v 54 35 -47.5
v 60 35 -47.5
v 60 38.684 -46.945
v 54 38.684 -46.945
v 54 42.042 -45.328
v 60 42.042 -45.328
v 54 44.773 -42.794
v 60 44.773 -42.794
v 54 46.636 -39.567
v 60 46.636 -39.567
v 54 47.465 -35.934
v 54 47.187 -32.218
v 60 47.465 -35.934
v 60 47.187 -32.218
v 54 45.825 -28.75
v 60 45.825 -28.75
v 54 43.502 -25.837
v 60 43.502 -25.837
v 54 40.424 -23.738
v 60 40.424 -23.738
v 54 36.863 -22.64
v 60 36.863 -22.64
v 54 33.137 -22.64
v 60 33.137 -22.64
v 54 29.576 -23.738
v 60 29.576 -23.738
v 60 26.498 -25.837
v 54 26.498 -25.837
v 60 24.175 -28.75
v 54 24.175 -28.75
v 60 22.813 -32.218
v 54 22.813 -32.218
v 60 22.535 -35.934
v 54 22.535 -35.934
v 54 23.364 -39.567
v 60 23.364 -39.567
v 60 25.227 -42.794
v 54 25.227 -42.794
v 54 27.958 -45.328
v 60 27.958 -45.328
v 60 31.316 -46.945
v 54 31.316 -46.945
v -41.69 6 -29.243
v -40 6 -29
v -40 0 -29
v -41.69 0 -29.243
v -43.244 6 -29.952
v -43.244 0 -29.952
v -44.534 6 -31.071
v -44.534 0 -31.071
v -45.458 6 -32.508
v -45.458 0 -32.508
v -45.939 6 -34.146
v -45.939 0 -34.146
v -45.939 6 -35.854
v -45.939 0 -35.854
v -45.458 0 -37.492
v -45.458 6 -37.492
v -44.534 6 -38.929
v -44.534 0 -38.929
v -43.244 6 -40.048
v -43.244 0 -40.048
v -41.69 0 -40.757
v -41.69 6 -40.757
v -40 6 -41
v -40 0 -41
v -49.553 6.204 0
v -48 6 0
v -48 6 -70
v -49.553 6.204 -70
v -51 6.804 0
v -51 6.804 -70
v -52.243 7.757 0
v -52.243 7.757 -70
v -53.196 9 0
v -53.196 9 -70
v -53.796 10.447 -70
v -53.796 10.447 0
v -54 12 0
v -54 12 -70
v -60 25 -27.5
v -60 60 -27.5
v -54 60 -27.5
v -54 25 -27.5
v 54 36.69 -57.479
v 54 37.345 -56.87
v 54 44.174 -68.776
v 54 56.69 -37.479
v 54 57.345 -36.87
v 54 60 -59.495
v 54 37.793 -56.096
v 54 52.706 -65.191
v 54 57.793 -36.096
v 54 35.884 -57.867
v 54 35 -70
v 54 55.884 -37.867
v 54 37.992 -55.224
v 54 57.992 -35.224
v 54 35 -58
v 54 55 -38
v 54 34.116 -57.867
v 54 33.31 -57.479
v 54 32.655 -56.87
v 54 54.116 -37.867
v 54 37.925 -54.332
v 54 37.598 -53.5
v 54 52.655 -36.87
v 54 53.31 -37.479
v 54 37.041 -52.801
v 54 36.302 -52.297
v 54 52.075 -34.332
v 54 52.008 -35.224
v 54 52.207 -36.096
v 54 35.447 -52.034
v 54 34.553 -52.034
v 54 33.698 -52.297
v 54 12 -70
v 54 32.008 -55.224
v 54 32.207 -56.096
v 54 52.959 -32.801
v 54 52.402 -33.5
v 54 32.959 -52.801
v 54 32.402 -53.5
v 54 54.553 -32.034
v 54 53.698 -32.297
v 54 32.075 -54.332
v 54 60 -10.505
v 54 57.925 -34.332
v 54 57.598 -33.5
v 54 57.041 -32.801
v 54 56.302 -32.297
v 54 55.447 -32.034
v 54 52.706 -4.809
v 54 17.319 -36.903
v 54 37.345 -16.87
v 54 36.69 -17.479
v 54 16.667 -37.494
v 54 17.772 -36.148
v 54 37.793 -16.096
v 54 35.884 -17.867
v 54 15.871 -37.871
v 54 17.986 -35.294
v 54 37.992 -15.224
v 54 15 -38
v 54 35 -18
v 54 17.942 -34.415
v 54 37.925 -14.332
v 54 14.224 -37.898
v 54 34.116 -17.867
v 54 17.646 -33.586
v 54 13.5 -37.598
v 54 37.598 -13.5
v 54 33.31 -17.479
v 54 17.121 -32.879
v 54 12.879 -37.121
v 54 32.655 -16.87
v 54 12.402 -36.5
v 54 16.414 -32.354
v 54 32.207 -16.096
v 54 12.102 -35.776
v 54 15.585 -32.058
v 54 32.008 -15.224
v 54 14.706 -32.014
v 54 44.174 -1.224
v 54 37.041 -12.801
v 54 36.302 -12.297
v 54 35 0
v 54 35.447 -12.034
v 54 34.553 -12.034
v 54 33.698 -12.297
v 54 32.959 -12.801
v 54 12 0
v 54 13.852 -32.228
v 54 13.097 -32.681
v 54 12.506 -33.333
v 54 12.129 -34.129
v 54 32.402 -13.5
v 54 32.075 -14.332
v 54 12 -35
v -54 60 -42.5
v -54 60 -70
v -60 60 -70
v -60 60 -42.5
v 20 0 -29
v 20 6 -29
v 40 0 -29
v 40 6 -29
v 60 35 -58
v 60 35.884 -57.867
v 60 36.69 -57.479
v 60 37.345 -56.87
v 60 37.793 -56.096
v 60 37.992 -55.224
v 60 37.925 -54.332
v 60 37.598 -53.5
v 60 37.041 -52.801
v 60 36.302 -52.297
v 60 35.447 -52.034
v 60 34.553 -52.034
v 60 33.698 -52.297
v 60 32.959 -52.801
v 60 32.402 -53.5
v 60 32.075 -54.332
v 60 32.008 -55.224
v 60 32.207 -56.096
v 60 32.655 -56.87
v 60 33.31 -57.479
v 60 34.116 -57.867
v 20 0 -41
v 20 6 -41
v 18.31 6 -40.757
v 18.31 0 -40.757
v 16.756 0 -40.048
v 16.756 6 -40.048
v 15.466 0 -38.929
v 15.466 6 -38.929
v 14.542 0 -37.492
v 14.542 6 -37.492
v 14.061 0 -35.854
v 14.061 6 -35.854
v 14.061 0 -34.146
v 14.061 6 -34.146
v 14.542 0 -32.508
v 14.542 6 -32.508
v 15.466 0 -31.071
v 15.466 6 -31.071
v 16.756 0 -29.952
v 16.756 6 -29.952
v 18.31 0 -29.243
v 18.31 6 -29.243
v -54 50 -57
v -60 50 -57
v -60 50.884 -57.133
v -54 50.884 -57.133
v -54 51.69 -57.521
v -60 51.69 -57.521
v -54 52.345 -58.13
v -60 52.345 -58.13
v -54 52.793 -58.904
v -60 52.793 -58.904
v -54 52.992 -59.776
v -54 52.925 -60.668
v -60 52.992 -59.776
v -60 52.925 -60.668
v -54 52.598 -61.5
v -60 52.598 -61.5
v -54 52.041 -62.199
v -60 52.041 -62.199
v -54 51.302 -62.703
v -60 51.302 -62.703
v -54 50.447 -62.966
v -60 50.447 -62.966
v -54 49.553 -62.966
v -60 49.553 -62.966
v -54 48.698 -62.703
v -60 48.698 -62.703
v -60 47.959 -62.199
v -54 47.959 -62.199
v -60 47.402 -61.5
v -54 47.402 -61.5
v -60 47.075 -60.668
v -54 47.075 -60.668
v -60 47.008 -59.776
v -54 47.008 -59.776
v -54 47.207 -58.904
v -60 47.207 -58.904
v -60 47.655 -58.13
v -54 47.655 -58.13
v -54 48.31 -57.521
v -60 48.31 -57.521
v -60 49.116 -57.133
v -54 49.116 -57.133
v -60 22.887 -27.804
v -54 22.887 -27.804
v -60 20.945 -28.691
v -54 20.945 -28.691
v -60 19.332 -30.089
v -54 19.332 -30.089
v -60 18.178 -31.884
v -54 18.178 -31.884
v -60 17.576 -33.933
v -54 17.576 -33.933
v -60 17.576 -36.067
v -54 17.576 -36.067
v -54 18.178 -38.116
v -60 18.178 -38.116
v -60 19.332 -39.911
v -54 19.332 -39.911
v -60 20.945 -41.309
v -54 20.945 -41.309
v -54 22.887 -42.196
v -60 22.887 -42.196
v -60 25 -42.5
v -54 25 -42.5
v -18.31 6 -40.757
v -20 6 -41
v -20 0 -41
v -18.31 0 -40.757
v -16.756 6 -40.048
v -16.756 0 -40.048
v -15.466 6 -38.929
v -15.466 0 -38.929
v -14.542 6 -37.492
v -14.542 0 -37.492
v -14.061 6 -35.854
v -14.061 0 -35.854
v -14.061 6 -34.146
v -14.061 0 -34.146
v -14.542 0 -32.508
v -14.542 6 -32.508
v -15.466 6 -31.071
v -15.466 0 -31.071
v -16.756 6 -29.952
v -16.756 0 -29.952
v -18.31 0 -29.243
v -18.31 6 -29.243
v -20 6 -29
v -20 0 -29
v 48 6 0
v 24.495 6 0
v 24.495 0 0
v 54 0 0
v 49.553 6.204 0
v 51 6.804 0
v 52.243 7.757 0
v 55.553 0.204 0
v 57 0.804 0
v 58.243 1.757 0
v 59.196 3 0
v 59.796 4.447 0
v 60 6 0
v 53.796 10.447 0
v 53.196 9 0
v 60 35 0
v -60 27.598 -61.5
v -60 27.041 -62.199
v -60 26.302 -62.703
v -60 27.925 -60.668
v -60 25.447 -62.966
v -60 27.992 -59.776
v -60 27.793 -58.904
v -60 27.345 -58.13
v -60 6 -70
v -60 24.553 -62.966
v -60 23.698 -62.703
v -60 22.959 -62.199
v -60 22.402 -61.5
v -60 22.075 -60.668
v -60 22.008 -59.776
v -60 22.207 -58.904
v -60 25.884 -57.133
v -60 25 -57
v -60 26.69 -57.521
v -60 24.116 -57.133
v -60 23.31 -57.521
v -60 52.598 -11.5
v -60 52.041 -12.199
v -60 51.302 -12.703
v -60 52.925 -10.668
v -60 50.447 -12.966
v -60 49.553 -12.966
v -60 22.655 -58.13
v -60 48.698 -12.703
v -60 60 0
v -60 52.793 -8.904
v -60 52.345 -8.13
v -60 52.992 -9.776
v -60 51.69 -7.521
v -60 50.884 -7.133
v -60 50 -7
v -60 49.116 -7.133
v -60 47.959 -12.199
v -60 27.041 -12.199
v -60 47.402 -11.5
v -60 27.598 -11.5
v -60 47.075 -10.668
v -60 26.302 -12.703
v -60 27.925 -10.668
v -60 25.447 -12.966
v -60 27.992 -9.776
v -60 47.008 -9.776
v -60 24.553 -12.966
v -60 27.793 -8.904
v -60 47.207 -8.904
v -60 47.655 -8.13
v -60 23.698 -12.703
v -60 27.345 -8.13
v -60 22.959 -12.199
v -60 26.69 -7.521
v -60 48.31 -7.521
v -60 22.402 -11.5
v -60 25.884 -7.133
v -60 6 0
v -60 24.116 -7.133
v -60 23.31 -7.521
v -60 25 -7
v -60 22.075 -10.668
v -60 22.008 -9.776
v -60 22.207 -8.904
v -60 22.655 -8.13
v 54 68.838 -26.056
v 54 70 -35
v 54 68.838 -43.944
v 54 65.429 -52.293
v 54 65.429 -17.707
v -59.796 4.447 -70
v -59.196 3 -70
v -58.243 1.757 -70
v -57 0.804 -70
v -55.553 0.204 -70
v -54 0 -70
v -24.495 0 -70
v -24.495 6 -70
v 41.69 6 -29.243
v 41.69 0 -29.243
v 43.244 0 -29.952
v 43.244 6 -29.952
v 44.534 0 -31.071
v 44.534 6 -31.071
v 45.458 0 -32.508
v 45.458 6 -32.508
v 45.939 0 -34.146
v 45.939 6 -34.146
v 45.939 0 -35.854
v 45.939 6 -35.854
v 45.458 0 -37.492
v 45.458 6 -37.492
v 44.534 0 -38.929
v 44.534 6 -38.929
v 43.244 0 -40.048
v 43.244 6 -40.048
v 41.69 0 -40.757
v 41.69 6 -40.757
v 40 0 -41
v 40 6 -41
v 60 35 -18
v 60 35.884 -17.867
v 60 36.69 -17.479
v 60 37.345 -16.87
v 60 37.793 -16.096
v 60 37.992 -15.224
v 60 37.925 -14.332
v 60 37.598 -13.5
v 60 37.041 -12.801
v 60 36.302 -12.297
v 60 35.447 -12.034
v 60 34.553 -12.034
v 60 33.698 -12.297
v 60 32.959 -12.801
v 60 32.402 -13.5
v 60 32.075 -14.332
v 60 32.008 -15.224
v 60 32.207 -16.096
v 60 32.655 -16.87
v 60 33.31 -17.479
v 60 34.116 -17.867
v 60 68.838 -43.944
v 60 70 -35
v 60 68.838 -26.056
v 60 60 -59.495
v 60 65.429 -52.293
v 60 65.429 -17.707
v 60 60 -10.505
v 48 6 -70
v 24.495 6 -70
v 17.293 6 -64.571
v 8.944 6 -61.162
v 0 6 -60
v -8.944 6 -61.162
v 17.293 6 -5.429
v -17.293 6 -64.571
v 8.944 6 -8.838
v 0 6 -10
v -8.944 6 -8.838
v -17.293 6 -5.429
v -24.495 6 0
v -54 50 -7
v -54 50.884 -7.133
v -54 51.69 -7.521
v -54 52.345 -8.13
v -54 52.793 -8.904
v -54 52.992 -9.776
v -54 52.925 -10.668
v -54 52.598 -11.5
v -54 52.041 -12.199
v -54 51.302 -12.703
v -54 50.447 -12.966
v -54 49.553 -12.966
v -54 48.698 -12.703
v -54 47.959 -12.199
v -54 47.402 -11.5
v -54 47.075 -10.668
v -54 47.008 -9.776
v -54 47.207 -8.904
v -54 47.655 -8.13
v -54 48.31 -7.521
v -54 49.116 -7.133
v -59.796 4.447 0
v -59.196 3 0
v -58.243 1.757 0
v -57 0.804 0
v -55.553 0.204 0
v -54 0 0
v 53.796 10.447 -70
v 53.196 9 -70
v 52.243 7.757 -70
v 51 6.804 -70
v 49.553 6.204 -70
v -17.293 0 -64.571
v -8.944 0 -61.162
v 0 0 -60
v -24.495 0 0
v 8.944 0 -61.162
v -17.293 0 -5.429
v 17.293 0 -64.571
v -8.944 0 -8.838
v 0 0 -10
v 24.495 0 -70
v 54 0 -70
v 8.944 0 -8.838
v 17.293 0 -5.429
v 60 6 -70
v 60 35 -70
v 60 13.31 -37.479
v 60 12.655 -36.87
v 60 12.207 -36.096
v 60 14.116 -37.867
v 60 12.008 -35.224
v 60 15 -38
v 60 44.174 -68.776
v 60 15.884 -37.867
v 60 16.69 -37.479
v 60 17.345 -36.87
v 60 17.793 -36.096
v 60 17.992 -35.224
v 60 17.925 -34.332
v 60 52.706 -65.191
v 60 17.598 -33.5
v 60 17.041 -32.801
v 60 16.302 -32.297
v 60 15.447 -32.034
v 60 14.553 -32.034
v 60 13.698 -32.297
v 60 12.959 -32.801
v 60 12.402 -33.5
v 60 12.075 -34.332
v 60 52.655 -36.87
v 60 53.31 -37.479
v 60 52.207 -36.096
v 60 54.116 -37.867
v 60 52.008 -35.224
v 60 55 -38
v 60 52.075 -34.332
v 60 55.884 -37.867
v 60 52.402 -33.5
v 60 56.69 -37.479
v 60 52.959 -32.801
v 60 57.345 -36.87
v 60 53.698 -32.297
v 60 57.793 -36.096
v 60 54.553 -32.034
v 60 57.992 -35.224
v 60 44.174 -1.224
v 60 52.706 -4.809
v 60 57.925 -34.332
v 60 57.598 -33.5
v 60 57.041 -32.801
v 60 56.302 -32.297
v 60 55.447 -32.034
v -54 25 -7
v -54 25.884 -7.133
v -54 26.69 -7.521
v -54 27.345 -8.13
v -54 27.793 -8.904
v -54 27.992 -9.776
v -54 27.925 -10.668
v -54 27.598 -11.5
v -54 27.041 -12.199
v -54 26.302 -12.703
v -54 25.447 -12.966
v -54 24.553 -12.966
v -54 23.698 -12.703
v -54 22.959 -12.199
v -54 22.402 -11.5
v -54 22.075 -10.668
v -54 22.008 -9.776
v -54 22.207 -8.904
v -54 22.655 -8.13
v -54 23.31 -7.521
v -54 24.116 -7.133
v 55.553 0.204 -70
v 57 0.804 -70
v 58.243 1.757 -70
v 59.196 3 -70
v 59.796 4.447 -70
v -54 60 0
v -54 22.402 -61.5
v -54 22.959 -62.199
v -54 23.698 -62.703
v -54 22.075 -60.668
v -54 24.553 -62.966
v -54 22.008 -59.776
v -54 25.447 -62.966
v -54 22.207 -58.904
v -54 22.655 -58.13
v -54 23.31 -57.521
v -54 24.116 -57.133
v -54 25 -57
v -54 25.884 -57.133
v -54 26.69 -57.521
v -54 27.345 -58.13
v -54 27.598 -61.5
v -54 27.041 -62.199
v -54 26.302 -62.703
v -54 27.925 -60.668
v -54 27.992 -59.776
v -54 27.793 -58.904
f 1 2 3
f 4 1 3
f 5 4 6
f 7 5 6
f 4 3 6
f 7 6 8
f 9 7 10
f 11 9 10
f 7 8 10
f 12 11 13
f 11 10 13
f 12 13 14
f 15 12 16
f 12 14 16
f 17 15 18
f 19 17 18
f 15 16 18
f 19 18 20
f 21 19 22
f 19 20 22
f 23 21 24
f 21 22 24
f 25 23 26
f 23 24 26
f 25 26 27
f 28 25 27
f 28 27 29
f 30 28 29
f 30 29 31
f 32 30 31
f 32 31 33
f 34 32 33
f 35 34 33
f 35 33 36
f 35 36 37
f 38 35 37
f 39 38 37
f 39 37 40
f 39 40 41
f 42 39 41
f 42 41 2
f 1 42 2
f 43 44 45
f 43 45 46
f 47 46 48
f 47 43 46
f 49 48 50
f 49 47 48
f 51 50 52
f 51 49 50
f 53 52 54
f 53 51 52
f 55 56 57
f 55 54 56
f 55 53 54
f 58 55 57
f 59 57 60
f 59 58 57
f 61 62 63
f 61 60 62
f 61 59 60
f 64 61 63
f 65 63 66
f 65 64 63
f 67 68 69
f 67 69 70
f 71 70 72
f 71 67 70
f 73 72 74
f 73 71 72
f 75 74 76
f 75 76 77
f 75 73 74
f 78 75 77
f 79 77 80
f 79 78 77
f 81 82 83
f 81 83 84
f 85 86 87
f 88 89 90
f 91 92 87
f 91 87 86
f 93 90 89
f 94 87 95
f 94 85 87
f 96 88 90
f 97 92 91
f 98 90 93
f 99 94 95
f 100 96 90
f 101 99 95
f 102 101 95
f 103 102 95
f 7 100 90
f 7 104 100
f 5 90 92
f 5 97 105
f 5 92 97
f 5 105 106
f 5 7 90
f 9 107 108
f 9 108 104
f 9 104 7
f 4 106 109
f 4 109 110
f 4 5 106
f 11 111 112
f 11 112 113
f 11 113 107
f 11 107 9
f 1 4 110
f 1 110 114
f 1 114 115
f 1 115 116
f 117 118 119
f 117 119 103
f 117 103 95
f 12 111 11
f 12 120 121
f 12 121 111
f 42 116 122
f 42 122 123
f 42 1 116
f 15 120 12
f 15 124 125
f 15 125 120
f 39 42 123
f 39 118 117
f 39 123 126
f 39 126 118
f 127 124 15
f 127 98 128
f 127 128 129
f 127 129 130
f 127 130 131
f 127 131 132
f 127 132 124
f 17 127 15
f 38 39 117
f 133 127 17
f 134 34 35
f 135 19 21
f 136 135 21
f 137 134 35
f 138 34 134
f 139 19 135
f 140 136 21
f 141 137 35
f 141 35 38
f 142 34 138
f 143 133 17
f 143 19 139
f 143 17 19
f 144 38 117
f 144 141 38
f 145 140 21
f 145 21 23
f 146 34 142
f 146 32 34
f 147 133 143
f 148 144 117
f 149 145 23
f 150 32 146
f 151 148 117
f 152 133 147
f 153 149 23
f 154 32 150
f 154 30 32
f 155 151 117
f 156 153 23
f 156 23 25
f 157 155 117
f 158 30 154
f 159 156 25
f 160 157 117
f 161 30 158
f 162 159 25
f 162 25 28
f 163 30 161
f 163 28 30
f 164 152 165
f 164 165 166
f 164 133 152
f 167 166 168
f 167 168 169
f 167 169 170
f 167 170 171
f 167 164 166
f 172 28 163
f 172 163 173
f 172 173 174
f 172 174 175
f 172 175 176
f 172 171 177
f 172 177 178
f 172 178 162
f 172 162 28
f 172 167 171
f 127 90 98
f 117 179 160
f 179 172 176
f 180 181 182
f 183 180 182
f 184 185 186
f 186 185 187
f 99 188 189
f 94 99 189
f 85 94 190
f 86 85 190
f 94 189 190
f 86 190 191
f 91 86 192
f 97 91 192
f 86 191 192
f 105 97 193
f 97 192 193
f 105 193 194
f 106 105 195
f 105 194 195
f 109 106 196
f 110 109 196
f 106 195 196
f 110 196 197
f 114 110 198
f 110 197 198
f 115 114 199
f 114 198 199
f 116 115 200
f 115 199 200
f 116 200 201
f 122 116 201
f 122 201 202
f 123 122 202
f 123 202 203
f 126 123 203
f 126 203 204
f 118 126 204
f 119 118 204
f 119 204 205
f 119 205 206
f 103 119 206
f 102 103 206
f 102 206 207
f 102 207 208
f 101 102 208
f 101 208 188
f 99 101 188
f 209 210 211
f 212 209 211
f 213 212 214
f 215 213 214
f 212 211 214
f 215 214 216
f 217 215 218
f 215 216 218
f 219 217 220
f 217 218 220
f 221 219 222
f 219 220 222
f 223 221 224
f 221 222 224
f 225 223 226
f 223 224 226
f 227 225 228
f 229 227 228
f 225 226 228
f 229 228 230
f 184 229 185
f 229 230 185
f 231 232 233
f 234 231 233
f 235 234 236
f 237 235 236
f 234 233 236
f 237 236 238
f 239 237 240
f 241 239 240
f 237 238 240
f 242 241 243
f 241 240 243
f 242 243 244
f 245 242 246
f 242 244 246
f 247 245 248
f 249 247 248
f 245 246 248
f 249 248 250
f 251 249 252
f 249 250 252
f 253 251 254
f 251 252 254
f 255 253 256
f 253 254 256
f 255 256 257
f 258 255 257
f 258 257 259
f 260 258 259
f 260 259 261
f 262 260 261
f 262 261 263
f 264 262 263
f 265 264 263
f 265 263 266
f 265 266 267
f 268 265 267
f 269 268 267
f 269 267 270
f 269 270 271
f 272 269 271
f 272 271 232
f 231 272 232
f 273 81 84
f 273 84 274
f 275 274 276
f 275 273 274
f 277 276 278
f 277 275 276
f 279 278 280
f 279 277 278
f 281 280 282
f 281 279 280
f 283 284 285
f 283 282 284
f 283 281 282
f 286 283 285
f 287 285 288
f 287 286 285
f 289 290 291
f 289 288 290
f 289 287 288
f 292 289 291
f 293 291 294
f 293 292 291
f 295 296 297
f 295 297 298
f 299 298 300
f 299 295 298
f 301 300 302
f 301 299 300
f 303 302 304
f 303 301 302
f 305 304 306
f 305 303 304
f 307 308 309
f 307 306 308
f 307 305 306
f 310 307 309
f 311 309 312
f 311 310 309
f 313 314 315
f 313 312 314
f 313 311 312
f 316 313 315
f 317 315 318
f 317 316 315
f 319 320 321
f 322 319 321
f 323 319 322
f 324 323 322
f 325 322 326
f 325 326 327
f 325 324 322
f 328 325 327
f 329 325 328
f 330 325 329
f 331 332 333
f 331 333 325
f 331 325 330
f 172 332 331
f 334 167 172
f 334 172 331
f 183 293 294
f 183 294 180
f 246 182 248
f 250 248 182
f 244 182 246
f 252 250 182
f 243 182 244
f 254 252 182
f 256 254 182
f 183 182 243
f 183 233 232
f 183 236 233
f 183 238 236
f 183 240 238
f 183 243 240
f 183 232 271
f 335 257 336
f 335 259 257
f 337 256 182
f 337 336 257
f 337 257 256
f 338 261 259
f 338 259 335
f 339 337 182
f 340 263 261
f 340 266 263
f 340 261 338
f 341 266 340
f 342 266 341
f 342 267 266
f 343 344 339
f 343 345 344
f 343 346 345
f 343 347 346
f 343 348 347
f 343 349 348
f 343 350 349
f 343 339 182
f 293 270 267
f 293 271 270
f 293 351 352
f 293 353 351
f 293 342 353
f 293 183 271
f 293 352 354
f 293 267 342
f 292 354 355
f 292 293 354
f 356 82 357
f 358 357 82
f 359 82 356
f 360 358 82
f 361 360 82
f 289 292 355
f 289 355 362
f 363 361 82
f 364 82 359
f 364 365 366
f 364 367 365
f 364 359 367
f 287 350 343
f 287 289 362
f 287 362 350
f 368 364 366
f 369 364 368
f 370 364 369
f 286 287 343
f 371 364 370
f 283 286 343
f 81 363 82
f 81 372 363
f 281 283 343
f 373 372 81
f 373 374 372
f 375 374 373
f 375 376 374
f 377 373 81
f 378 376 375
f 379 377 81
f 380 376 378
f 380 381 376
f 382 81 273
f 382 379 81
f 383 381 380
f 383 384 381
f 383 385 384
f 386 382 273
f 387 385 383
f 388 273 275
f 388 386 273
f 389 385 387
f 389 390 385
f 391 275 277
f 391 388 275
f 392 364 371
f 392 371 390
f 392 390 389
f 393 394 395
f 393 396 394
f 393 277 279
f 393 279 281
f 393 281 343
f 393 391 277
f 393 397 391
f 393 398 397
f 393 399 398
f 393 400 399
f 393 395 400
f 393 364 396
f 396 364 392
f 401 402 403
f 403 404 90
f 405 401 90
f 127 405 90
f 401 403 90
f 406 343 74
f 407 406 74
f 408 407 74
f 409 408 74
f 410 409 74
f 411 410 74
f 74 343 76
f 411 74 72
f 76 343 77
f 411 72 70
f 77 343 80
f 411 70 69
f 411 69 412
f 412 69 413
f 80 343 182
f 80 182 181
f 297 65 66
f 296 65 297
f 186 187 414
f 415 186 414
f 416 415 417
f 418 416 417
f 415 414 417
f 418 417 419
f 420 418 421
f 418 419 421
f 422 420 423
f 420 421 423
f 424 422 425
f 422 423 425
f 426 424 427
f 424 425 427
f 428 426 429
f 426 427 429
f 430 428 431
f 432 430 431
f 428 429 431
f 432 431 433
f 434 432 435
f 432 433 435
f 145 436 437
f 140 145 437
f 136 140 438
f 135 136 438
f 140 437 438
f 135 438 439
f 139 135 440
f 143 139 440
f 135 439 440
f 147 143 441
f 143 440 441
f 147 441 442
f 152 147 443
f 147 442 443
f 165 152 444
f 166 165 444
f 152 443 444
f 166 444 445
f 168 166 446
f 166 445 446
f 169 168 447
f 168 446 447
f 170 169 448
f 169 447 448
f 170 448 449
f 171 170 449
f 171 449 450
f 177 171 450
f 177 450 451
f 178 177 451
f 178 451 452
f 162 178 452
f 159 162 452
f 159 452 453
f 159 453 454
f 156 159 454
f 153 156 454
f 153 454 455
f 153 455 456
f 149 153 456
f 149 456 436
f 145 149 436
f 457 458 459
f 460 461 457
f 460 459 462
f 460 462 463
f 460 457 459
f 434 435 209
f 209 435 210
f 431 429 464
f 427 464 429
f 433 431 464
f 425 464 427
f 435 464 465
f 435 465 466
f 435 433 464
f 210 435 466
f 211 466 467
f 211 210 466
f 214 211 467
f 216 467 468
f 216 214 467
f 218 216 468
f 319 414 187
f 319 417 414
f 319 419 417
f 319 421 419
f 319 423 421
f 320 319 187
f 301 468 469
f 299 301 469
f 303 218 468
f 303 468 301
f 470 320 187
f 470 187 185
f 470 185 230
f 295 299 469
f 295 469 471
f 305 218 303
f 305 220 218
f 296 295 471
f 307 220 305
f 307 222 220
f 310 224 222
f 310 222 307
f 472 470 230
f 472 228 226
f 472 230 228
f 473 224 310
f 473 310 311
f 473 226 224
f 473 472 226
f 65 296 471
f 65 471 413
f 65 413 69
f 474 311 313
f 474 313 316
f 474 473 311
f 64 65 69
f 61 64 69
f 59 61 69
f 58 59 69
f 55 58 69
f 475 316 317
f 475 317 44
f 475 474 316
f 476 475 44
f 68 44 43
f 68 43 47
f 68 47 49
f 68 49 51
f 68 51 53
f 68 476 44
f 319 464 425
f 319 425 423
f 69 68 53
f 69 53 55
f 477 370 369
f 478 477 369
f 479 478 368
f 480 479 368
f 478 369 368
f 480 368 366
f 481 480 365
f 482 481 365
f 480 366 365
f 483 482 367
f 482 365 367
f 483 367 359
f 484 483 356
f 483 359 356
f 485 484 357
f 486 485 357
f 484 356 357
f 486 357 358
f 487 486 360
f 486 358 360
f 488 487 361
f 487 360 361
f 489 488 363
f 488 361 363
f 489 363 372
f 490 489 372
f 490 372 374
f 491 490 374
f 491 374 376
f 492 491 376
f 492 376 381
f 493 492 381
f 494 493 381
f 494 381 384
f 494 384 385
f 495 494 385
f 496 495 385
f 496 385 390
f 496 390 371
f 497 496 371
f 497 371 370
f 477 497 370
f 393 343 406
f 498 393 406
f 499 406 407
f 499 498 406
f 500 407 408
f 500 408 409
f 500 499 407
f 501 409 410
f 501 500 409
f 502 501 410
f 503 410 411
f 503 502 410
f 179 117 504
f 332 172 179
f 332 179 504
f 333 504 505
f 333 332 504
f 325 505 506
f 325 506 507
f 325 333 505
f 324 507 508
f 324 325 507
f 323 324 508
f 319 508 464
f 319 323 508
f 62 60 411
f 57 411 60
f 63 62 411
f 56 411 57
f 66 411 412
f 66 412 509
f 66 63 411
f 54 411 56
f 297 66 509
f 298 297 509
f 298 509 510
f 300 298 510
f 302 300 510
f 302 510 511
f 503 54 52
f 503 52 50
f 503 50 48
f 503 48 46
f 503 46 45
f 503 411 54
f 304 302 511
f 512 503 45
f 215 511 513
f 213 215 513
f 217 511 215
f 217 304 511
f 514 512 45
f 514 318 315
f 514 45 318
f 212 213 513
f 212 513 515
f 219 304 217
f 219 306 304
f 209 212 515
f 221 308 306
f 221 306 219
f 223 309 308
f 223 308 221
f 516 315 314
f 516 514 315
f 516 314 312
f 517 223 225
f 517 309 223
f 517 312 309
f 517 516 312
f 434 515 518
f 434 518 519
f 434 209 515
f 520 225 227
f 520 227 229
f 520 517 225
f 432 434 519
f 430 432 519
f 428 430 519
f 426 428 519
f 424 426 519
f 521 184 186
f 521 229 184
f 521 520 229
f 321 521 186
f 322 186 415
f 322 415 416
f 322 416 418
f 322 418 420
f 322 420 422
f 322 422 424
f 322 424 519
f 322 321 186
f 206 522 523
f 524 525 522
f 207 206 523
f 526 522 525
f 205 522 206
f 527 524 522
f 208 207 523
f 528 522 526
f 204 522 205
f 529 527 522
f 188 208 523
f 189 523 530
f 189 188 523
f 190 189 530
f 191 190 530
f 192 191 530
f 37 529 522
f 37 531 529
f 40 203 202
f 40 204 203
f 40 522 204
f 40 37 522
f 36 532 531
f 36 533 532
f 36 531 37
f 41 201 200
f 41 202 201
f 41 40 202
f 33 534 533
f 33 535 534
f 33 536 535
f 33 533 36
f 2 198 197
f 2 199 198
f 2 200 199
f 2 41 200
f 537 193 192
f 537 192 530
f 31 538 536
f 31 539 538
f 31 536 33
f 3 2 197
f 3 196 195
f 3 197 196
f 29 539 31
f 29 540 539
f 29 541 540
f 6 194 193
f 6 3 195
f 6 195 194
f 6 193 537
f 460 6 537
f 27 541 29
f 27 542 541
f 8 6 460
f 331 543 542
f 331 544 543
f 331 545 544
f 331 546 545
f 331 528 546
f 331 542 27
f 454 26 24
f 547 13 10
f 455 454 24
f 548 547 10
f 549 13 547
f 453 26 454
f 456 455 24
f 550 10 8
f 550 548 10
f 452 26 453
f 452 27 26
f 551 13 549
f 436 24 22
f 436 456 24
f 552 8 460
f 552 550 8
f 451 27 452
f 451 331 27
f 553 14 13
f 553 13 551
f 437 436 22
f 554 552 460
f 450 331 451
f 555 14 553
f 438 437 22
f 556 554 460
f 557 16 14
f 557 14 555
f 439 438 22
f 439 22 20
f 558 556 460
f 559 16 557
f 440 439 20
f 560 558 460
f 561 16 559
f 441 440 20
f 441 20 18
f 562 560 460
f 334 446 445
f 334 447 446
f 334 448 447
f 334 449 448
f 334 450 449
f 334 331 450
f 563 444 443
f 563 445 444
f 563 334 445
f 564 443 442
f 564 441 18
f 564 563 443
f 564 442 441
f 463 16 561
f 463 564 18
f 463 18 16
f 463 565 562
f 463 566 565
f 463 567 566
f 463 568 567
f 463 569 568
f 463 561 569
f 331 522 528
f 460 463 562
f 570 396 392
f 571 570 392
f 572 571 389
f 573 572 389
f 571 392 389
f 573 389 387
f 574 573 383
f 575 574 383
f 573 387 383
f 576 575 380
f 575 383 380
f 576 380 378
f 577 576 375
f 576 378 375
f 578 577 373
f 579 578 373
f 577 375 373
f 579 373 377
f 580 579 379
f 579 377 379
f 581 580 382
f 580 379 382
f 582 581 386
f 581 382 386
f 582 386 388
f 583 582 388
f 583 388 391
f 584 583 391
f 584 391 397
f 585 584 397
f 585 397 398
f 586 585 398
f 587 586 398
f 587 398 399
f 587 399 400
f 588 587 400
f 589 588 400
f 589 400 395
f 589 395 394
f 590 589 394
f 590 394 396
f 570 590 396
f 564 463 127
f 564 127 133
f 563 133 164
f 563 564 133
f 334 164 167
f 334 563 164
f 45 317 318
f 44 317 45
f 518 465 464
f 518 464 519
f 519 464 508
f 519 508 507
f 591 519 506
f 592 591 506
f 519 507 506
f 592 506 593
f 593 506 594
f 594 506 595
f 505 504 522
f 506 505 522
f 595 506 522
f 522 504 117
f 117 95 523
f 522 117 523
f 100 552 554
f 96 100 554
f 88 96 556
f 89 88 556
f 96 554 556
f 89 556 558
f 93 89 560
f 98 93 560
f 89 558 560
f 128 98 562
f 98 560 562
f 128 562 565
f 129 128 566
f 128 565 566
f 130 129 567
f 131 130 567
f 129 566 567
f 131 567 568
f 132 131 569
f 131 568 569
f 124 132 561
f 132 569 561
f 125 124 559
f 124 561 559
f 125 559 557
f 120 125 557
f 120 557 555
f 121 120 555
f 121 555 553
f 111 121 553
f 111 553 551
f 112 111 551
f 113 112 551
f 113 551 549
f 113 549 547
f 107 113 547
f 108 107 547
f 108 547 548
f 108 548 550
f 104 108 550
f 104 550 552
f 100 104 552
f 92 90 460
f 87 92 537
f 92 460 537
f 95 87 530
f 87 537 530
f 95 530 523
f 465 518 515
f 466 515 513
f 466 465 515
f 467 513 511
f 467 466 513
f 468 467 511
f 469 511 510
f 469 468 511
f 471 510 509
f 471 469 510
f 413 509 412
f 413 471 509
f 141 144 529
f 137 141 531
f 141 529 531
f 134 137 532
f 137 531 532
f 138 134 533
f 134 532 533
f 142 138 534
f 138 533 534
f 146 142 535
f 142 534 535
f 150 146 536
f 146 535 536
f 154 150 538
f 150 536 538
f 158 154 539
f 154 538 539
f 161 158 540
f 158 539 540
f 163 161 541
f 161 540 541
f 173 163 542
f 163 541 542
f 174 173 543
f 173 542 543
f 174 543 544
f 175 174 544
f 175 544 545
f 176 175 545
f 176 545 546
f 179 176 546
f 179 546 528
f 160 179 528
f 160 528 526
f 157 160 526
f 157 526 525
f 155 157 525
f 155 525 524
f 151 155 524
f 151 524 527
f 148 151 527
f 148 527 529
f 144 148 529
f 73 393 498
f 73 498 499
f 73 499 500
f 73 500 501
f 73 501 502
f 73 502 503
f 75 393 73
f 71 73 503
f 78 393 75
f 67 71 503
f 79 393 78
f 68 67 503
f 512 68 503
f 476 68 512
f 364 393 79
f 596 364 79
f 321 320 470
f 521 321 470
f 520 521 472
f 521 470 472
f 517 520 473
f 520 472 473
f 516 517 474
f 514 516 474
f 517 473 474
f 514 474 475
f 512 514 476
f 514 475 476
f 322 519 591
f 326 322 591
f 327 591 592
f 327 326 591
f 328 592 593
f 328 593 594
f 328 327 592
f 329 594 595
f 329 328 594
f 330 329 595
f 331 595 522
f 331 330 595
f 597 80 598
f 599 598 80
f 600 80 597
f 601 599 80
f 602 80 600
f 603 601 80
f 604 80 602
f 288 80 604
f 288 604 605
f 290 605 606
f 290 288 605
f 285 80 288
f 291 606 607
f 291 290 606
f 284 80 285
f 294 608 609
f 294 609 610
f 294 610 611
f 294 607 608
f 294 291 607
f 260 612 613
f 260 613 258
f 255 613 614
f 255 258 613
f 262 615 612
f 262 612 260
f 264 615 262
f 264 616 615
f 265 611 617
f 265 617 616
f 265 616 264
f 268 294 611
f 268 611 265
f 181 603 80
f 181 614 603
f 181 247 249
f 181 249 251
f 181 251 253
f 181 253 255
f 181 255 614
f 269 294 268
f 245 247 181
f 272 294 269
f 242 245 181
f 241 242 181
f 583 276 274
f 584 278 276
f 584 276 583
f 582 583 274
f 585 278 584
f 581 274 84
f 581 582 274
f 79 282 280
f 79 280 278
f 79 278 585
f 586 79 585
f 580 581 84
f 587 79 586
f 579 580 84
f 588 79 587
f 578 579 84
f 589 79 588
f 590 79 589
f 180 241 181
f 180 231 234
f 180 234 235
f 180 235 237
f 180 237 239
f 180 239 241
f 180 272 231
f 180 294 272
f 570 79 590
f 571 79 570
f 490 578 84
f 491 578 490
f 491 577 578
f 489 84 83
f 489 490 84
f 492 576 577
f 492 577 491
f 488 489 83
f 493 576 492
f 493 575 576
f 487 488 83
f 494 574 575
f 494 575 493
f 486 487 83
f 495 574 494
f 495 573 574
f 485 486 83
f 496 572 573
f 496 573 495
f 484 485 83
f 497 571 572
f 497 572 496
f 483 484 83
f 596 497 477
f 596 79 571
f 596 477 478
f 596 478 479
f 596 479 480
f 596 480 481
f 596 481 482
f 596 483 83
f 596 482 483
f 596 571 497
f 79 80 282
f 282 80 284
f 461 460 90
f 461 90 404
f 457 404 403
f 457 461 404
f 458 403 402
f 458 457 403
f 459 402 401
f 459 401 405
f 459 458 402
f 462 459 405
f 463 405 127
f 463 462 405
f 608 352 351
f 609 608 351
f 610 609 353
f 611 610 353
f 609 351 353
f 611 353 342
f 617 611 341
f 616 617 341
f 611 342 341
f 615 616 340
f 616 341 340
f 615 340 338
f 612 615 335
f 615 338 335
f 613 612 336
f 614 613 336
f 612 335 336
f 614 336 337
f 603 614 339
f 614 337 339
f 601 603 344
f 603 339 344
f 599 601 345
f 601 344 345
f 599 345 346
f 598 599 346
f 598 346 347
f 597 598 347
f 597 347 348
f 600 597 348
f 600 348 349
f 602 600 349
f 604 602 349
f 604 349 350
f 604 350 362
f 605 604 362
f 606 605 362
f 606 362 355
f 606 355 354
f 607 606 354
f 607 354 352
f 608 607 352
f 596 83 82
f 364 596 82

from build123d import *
from build123d.topology import SkipClean

# Parameters (mm, degrees)
BASEPLATEEXTRUDE_DEPTH = 70
FEATUREOP1_DEPTH       = 33
FEATUREOP2_DEPTH       = 6
SKETCH4_R              = 12.5
FEATUREOP3_DEPTH       = 16
SKETCH5_R              = 3
FEATUREOP4_DEPTH       = 16
SKETCH6_R              = 3
FEATUREOP5_DEPTH       = 16
FEATUREOP6_DEPTH       = 16


with BuildPart() as part:
    # Sketch1 → BasePlateExtrude (new body)
    with BuildSketch(Plane.XY):
        with BuildLine():
            Line((-54, 0), (54, 0))
            ThreePointArc((54, 0), (58.242640687, 1.757359313), (60, 6))
            Line((60, 6), (60, 60))
            Line((60, 60), (54, 60))
            Line((54, 60), (54, 12))
            ThreePointArc((54, 12), (52.242640687, 7.757359313), (48, 6))
            Line((48, 6), (-48, 6))
            ThreePointArc((-48, 6), (-52.242640687, 7.757359313), (-54, 12))
            Line((-54, 12), (-54, 60))
            Line((-54, 60), (-60, 60))
            Line((-60, 60), (-60, 6))
            ThreePointArc((-60, 6), (-58.242640687, 1.757359313), (-54, 0))
        make_face()
    extrude(amount=-BASEPLATEEXTRUDE_DEPTH)

    # Sketch2 → FeatureOp1 (cut)
    with BuildSketch(Plane(origin=(60, 0, 0), x_dir=(0, 0, -1), z_dir=(1, 0, 0))):
        with BuildLine():
            Line((0, 35), (0, 60))
            Line((0, 60), (10.505102572, 60))
            ThreePointArc((10.505102572, 60), (2.732978058, 48.558735008), (0, 35))
        make_face()
        with BuildLine():
            Line((70, 35), (70, 60))
            Line((70, 60), (59.494897428, 60))
            ThreePointArc((59.494897428, 60), (67.267021942, 48.558735008), (70, 35))
        make_face()
    extrude(amount=-FEATUREOP1_DEPTH, mode=Mode.SUBTRACT)

    # Sketch3 → FeatureOp2 (add)
    with SkipClean():  # the faces are left unmerged after this step: merging them gives an invalid solid
        with BuildSketch(Plane(origin=(60, 0, 0), x_dir=(0, 0, -1), z_dir=(1, 0, 0))):
            with BuildLine():
                Line((10.505102572, 60), (59.494897428, 60))
                ThreePointArc((59.494897428, 60), (35, 70), (10.505102572, 60))
            make_face()
        extrude(amount=-FEATUREOP2_DEPTH)

    # Sketch4 → FeatureOp3 (cut)
    with SkipClean():  # the faces are left unmerged after this step: merging them gives an invalid solid
        with BuildSketch(Plane(origin=(60, 0, 0), x_dir=(0, 0, -1), z_dir=(1, 0, 0))):
            with Locations((35, 35)):
                Circle(SKETCH4_R)
        extrude(amount=-FEATUREOP3_DEPTH, mode=Mode.SUBTRACT)

    # Sketch5 → FeatureOp4 (cut)
    with SkipClean():  # the faces are left unmerged after this step: merging them gives an invalid solid
        with BuildSketch(Plane(origin=(60, 0, 0), x_dir=(0, 0, -1), z_dir=(1, 0, 0))):
            with Locations((35, 55)):
                Circle(SKETCH5_R)
            with Locations((55, 35)):
                Circle(SKETCH5_R)
            with Locations((35, 15)):
                Circle(SKETCH5_R)
            with Locations((15, 35)):
                Circle(SKETCH5_R)
        extrude(amount=-FEATUREOP4_DEPTH, mode=Mode.SUBTRACT)

    # Sketch6 → FeatureOp5 (cut)
    with SkipClean():  # the faces are left unmerged after this step: merging them gives an invalid solid
        with BuildSketch(Plane.ZY.offset(60)):
            with Locations((-60, 50)):
                Circle(SKETCH6_R)
            with Locations((-60, 25)):
                Circle(SKETCH6_R)
            with Locations((-10, 50)):
                Circle(SKETCH6_R)
            with Locations((-10, 25)):
                Circle(SKETCH6_R)
            with BuildLine():
                Line((-42.5, 60), (-27.5, 60))
                Line((-27.5, 60), (-27.5, 25))
                ThreePointArc((-27.5, 25), (-35, 17.5), (-42.5, 25))
                Line((-42.5, 25), (-42.5, 60))
            make_face()
        extrude(amount=-FEATUREOP5_DEPTH, mode=Mode.SUBTRACT)

    # Sketch7 → FeatureOp6 (cut)
    with SkipClean():  # the faces are left unmerged after this step: merging them gives an invalid solid
        with BuildSketch(Plane(origin=(0, 6, 0), x_dir=(1, 0, 0), z_dir=(0, 1, 0))):
            with BuildLine():
                Line((-40, 41), (-20, 41))
                ThreePointArc((-20, 41), (-14, 35), (-20, 29))
                Line((-20, 29), (-40, 29))
                ThreePointArc((-40, 29), (-46, 35), (-40, 41))
            make_face()
            with BuildLine():
                Line((20, 29), (40, 29))
                ThreePointArc((40, 29), (46, 35), (40, 41))
                Line((40, 41), (20, 41))
                ThreePointArc((20, 41), (14, 35), (20, 29))
            make_face()
            with BuildLine():
                Line((-24.494897428, 0), (24.494897428, 0))
                ThreePointArc((24.494897428, 0), (0, 10), (-24.494897428, 0))
            make_face()
            with BuildLine():
                Line((-24.494897428, 70), (24.494897428, 70))
                ThreePointArc((24.494897428, 70), (0, 60), (-24.494897428, 70))
            make_face()
        extrude(amount=-FEATUREOP6_DEPTH, mode=Mode.SUBTRACT)


solid = part.part
